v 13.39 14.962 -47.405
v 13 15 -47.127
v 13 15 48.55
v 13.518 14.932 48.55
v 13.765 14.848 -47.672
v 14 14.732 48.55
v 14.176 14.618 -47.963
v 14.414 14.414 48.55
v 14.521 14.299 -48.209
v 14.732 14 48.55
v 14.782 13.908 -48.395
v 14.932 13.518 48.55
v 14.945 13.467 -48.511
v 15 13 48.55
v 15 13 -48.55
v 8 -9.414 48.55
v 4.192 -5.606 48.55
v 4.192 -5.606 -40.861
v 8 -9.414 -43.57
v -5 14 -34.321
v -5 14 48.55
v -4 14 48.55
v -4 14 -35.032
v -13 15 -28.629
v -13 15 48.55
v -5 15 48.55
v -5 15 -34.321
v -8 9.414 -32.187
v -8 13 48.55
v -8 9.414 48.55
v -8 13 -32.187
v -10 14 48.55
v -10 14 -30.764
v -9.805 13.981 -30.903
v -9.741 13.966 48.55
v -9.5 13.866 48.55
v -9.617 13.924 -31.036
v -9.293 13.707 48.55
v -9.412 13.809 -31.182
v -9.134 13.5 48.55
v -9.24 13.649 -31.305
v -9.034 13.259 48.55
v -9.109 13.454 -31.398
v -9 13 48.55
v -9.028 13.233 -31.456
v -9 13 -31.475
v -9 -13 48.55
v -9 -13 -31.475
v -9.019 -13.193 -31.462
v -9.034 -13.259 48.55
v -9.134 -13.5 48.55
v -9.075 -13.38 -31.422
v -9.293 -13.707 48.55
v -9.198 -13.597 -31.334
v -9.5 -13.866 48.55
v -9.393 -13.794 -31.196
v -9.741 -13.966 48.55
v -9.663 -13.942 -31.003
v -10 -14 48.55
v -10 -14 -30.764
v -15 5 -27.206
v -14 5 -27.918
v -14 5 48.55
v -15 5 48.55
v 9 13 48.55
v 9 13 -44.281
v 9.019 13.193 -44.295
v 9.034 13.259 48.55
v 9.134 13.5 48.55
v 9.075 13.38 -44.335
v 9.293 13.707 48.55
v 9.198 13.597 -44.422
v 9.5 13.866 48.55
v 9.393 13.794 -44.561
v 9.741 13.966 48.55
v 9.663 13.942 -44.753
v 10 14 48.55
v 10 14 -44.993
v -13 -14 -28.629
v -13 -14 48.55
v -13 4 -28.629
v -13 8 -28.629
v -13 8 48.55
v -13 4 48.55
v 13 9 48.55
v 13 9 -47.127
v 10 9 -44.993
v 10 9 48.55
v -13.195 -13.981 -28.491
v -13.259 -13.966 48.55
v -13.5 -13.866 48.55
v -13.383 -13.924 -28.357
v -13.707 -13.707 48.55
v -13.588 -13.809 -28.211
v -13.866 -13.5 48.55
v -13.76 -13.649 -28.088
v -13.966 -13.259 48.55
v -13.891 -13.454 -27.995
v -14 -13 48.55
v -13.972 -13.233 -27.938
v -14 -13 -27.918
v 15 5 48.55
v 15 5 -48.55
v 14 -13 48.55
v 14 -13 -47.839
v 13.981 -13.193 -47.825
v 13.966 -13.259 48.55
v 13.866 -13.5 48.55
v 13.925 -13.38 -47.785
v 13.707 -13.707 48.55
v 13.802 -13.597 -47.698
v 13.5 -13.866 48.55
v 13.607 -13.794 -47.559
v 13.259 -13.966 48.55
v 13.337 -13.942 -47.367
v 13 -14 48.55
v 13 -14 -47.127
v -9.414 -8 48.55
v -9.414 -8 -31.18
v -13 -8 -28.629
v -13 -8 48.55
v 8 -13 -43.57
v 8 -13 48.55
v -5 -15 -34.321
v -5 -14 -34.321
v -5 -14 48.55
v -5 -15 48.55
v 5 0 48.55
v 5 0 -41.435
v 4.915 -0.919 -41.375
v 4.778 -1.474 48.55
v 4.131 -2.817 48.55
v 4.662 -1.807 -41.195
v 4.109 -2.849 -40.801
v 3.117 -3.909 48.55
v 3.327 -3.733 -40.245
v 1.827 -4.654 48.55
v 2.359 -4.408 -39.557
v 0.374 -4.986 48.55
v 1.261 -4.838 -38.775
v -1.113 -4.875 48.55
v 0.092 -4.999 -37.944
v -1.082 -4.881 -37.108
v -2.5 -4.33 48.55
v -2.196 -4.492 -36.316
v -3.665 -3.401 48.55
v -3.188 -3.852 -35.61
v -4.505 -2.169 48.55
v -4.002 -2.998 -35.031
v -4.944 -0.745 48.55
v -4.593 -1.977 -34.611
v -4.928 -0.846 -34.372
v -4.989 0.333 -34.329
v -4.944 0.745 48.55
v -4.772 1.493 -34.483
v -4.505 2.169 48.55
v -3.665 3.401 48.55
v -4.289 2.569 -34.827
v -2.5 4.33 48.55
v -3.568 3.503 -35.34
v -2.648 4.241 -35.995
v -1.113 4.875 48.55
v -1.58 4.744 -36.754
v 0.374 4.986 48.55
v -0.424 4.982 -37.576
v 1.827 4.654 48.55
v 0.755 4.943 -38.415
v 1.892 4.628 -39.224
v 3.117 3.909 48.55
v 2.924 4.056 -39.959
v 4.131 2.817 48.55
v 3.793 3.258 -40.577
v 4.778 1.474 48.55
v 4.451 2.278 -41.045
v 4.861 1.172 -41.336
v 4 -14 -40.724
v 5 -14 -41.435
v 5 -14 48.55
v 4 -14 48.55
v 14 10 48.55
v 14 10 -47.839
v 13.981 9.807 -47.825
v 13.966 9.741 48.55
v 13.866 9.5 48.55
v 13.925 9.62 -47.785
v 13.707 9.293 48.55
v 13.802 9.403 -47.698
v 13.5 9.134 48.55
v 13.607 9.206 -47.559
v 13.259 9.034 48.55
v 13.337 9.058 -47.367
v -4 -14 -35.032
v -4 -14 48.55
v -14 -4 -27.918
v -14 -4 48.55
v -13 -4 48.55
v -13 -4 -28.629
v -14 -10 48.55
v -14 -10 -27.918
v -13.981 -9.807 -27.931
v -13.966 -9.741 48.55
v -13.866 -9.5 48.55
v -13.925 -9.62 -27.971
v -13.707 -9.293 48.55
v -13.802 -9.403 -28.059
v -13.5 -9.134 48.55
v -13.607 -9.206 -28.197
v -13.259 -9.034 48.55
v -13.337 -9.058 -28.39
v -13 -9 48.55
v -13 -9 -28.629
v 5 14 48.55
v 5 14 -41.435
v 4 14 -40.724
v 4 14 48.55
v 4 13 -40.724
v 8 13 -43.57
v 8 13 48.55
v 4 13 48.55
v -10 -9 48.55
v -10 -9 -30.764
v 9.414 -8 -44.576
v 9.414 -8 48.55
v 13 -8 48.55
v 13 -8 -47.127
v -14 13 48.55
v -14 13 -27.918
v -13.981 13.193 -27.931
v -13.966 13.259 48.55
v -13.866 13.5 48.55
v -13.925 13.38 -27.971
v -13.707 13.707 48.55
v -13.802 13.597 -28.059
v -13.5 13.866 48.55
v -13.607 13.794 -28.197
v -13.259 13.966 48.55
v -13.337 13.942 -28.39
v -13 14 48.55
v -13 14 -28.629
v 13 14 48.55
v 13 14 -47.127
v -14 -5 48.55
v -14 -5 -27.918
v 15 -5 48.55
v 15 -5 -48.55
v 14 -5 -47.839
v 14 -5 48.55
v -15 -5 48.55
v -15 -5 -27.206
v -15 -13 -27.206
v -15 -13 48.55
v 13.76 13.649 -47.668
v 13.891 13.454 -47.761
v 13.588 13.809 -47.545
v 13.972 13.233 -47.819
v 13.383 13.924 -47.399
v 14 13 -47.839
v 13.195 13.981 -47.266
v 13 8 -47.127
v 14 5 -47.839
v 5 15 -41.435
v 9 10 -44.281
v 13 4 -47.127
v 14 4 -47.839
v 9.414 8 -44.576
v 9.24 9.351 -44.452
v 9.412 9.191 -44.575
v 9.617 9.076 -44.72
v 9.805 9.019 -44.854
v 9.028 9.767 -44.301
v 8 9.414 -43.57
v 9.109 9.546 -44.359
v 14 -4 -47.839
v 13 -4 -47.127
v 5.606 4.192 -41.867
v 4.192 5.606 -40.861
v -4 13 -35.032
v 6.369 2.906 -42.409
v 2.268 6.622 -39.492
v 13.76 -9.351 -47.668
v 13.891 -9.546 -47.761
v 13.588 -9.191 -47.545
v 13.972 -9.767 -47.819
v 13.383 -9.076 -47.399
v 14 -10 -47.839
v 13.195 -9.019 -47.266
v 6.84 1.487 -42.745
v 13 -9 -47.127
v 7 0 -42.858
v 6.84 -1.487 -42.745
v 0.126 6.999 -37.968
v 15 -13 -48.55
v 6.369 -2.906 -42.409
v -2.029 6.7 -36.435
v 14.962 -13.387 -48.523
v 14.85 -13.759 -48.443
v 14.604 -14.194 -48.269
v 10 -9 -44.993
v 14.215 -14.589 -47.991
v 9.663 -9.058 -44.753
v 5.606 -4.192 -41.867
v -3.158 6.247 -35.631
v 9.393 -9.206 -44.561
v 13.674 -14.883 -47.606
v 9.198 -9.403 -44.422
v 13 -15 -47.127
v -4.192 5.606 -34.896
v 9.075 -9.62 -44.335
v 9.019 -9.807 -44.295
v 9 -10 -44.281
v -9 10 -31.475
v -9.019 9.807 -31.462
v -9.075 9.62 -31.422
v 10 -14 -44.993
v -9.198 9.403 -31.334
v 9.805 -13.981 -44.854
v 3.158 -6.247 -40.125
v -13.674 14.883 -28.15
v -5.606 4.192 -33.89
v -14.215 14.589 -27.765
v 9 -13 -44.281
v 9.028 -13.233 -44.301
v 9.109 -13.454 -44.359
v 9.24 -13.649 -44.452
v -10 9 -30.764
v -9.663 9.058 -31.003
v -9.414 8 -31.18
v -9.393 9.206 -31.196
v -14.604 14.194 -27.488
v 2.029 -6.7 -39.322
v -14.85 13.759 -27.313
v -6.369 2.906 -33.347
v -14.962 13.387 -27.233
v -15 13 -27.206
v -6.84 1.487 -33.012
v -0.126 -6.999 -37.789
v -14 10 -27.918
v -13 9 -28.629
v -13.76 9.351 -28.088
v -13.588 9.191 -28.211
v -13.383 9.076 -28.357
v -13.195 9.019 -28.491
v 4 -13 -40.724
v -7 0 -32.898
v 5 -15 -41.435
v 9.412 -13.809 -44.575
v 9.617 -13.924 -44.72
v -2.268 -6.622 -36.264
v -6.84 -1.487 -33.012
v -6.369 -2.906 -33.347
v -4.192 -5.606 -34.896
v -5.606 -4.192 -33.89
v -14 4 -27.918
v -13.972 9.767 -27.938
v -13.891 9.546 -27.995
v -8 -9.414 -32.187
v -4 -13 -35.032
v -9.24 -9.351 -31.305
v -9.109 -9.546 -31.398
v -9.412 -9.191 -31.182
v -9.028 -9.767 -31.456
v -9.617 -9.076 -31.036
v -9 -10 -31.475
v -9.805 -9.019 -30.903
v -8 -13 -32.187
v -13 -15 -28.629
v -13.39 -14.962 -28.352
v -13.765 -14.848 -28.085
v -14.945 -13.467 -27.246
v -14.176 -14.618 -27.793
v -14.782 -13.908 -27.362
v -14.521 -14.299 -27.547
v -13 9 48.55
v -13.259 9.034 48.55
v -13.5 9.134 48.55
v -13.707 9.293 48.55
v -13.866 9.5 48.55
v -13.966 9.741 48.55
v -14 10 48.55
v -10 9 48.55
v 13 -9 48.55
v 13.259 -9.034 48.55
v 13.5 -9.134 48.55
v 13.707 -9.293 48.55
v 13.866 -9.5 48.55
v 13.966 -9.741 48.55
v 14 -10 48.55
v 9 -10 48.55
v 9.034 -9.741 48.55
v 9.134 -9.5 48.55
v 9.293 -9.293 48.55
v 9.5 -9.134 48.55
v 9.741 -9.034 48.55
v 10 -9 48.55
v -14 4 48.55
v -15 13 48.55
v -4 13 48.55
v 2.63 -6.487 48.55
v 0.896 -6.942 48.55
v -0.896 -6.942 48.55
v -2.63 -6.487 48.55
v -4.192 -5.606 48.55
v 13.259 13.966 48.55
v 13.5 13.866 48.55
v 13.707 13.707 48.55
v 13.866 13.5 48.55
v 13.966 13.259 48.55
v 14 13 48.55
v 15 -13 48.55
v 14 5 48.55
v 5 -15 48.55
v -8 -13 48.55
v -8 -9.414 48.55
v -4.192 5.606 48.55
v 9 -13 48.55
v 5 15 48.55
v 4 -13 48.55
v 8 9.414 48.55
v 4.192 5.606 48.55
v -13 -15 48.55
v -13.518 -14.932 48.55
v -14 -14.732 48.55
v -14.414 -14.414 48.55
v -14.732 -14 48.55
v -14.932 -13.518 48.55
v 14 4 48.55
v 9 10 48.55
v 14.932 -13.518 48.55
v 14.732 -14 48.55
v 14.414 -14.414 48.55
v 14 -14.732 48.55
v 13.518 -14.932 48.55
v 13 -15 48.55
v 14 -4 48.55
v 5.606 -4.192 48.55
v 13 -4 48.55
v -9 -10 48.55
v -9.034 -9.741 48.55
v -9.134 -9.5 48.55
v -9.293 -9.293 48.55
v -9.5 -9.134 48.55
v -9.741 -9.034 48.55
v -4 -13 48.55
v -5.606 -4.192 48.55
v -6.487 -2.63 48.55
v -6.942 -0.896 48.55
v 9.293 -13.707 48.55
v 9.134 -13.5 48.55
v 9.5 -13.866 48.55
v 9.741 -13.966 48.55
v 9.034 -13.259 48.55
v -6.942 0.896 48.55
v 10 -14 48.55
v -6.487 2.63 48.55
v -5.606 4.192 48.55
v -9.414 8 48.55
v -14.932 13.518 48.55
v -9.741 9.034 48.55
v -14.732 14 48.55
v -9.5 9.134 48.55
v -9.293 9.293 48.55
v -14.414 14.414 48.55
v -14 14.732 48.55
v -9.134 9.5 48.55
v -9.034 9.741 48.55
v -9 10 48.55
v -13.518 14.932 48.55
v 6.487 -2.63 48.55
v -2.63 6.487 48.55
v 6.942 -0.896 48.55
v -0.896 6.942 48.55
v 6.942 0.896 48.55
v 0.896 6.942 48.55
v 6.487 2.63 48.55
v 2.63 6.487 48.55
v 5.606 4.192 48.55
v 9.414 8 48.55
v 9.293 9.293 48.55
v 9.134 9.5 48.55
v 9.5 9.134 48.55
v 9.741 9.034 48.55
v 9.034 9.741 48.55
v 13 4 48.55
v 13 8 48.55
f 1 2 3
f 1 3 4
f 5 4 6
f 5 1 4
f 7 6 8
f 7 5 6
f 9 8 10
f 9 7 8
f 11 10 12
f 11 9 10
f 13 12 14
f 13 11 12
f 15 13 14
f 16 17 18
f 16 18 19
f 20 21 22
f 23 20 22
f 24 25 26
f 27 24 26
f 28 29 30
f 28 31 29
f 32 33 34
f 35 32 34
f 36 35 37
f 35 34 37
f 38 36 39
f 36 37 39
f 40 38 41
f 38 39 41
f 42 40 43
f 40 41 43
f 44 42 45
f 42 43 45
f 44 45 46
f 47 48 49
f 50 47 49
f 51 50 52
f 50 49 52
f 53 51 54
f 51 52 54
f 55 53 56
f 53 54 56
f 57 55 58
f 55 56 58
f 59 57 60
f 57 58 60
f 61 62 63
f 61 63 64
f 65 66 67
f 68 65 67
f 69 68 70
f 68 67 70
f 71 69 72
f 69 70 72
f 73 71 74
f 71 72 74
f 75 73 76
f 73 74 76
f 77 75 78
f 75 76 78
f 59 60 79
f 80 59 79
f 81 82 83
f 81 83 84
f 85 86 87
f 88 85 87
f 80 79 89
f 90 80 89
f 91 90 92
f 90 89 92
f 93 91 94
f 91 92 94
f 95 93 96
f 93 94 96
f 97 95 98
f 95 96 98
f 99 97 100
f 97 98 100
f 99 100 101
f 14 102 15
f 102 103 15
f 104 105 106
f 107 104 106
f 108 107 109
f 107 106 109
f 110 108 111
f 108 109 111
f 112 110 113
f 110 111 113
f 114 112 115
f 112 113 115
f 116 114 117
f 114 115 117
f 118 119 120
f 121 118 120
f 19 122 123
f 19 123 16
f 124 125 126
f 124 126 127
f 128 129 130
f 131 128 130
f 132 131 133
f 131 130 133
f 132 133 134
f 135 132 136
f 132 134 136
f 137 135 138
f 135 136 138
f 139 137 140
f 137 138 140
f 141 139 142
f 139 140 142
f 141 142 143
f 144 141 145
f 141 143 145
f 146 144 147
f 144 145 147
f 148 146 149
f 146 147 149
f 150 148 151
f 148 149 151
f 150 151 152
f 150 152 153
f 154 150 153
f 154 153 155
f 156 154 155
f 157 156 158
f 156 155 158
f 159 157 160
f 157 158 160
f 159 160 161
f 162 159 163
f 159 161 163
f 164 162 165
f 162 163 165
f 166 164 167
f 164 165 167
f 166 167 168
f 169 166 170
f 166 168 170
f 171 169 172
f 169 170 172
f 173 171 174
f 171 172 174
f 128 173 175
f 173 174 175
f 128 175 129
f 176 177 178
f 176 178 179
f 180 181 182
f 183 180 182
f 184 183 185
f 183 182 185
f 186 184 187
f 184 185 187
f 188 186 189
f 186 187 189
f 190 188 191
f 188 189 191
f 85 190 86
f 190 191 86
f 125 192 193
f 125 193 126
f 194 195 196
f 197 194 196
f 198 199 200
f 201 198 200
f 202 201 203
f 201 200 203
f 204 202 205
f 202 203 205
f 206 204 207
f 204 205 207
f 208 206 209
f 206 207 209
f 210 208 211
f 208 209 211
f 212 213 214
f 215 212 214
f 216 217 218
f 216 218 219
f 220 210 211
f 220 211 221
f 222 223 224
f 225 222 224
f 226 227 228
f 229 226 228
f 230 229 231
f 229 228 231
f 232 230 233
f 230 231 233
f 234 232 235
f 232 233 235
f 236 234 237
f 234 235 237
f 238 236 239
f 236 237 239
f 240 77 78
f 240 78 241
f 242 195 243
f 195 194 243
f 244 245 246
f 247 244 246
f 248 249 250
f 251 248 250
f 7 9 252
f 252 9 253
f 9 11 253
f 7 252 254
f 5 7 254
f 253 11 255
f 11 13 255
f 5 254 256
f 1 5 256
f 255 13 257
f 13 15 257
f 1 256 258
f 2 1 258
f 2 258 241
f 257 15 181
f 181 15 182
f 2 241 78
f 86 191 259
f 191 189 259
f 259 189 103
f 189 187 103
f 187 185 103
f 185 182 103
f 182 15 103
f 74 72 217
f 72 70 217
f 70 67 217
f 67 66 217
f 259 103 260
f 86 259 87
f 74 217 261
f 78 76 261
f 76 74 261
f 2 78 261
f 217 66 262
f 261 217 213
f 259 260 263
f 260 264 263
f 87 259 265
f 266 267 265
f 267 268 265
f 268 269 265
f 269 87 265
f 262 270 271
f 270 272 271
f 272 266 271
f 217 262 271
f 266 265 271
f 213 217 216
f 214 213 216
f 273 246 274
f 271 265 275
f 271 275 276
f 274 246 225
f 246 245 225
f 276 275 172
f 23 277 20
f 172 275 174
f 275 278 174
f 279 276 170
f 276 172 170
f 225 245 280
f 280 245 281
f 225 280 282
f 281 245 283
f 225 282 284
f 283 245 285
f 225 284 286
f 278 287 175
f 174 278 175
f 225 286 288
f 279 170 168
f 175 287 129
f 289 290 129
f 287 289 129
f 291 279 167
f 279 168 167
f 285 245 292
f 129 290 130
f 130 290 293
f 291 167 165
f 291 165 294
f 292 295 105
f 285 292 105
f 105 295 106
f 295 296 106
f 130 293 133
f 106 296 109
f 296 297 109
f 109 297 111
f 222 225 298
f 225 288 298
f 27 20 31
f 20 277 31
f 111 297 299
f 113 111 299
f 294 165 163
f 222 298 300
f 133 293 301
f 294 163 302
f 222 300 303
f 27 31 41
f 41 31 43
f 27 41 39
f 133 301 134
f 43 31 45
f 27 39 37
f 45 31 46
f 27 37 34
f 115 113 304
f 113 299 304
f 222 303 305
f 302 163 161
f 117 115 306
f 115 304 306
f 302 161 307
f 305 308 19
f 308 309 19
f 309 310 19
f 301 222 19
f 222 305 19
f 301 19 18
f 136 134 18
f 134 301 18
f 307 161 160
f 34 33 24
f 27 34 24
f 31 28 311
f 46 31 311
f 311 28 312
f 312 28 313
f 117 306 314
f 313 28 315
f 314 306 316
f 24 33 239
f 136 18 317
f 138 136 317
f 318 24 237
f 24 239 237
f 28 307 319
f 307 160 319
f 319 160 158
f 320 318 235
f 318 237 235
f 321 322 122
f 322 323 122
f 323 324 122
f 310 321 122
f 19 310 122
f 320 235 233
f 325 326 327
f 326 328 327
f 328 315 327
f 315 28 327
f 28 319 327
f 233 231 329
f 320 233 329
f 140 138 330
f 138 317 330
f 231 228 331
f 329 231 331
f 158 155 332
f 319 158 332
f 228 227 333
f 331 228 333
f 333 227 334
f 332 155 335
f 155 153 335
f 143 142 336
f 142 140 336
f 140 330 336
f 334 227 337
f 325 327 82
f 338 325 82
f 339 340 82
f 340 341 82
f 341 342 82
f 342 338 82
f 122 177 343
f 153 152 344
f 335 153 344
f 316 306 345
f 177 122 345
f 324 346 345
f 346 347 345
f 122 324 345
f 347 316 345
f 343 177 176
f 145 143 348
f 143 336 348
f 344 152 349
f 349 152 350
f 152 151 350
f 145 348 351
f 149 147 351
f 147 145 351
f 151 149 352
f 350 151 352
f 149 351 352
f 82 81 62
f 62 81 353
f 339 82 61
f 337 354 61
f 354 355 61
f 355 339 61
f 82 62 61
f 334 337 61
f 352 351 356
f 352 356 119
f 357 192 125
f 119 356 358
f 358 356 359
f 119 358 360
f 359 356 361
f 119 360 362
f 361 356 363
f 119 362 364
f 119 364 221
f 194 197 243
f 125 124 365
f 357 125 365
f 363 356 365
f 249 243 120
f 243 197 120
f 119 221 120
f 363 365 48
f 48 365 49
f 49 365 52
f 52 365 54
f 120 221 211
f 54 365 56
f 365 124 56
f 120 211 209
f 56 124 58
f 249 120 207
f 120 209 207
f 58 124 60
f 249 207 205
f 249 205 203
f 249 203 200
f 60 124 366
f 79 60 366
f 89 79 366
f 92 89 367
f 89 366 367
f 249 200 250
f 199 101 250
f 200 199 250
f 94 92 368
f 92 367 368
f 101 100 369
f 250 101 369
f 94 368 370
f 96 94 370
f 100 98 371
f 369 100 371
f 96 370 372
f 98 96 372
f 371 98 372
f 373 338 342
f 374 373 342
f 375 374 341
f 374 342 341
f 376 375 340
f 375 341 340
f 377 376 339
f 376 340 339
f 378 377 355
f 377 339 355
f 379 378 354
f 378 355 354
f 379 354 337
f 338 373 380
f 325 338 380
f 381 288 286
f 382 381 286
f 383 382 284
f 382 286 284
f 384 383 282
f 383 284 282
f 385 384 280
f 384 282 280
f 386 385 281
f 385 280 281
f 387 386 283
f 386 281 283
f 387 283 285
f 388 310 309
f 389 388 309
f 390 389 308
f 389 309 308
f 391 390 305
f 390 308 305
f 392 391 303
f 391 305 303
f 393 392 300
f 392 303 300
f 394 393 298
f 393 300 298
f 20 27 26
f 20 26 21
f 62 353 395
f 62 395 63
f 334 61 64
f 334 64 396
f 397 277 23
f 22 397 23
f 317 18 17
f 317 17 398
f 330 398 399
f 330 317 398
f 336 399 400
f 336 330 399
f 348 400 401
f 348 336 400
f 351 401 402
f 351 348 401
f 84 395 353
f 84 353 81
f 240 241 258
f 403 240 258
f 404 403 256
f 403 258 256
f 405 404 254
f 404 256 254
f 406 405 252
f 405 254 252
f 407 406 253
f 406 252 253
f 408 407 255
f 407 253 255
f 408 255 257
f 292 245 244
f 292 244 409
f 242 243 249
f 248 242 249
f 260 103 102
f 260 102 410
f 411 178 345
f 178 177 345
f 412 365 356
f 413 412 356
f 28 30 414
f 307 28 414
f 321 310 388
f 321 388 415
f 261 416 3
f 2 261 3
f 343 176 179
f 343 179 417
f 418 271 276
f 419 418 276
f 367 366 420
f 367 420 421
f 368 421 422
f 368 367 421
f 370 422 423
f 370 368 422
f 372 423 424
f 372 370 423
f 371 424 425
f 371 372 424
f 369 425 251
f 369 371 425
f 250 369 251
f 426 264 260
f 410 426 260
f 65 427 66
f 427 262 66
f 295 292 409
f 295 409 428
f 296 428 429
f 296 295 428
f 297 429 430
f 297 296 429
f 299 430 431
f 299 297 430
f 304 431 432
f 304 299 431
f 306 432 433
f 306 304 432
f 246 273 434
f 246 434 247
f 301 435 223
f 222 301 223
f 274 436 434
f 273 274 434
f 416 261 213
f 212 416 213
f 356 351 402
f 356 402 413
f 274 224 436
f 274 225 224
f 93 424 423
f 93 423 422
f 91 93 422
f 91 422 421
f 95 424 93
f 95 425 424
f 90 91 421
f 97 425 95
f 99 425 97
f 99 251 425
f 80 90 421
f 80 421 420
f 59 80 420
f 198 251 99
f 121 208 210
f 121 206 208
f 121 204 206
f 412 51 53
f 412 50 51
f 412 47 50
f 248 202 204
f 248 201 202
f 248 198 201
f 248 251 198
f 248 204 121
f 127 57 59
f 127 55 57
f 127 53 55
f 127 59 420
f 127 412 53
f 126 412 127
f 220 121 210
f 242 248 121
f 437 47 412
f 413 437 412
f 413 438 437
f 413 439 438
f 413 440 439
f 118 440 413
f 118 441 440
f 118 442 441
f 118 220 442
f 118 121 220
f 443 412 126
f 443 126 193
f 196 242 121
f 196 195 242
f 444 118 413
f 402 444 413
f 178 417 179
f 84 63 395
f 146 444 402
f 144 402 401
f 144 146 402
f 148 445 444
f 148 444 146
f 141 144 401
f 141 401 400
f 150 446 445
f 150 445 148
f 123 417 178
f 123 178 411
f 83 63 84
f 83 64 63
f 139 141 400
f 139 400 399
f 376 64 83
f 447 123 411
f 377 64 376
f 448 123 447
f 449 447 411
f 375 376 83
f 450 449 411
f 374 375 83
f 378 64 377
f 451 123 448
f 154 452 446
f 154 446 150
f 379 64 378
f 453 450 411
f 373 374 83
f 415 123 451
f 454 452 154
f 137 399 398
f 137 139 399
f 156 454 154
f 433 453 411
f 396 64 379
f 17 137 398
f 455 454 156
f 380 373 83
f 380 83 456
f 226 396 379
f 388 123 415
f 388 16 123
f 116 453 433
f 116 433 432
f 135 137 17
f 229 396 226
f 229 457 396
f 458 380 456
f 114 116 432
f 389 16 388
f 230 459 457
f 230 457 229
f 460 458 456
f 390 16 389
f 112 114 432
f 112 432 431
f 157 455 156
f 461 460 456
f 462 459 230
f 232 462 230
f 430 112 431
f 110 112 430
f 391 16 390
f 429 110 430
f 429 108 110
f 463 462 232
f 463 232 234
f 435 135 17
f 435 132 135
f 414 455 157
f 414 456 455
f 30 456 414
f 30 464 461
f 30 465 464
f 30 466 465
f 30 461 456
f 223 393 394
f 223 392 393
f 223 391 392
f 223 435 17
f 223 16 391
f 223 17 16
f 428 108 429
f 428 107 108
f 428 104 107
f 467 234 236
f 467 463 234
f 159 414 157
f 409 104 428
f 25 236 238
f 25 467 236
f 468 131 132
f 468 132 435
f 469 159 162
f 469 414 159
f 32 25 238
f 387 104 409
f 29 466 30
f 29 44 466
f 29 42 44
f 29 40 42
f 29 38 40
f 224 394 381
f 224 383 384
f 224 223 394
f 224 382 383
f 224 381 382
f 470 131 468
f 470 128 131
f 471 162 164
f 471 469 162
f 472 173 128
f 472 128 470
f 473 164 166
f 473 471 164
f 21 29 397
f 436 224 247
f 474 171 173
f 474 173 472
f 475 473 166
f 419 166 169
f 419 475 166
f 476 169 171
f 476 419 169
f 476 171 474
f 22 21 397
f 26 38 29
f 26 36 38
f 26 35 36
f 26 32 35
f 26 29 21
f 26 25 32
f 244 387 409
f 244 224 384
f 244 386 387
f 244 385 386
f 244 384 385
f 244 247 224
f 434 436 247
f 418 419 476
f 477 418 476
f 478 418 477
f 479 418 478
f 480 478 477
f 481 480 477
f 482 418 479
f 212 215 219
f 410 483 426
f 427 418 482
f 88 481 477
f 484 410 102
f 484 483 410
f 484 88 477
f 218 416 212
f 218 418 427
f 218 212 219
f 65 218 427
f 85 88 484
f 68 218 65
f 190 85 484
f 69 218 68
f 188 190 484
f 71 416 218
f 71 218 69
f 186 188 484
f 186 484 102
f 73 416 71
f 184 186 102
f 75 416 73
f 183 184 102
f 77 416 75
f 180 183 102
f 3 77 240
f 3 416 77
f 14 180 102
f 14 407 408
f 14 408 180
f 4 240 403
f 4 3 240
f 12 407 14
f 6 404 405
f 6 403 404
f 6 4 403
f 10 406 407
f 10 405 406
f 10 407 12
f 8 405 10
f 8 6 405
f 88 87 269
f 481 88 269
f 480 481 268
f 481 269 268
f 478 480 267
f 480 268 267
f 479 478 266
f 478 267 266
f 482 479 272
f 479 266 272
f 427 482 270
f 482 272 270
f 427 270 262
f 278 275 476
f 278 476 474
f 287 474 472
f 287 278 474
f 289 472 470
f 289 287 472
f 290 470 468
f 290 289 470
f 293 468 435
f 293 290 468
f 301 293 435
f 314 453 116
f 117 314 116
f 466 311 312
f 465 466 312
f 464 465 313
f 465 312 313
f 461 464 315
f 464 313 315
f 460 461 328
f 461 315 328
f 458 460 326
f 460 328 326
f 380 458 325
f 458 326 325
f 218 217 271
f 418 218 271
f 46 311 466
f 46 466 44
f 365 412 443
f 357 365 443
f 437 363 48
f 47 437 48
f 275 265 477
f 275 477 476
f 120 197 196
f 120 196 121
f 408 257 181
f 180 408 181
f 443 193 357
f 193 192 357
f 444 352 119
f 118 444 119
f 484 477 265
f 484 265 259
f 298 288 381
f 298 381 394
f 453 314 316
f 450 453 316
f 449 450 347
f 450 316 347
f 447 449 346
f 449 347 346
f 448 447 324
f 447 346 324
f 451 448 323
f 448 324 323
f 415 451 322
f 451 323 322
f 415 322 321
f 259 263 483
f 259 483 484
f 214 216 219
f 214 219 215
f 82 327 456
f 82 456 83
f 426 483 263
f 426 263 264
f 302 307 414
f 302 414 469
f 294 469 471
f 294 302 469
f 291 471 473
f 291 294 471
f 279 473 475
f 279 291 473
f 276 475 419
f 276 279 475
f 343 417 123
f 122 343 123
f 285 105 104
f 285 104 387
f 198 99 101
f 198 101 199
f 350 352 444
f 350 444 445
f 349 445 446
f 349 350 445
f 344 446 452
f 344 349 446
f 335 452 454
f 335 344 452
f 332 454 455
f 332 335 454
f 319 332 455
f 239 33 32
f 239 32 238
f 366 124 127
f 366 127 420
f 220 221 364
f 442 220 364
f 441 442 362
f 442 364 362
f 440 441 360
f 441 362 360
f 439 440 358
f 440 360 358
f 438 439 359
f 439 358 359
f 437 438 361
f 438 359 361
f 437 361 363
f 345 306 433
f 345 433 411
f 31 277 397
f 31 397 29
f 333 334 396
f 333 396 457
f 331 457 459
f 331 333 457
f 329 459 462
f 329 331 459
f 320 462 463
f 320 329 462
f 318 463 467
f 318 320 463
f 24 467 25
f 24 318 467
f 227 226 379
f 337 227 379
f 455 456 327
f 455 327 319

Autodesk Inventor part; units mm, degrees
ref_plane "YZ Plane" through (0, 0, 0) normal (1, 0, 0) x (0, 1, 0)
ref_plane "XZ Plane" through (0, 0, 0) normal (0, 1, 0) x (-1, 0, 0)
ref_plane "XY Plane" through (0, 0, 0) normal (0, 0, 1) x (1, 0, 0)
sketch "Sketch1" plane through (0, 0, 0) normal (0, 0, 1) x (1, 0, 0)
  circle A0 centre (0, 0) radius 5
  arc A1 (-13, 15) -> (-15, 13) centre (-13, 13) ccw
  arc A2 (-15, -13) -> (-13, -15) centre (-13, -13) ccw
  arc A3 (13, -15) -> (15, -13) centre (13, -13) ccw
  arc A4 (15, 13) -> (13, 15) centre (13, 13) ccw
  arc A5 (-13, 14) -> (-14, 13) centre (-13, 13) ccw
  arc A6 (-14, -13) -> (-13, -14) centre (-13, -13) ccw
  arc A7 (13, -14) -> (14, -13) centre (13, -13) ccw
  arc A8 (14, 13) -> (13, 14) centre (13, 13) ccw
  line L0 (14, -14) -> (-14, 14) construction
  line L1 (-14, -14) -> (14, 14) construction
  line L2 (15, -15) -> (-15, 15) construction
  line L3 (-15, -15) -> (15, 15) construction
  line L4 (-13, 15) -> (-8, 15)
  line L5 (-8, 13) -> (-8, 8) construction
  line L6 (-9.4142, 8) -> (-13, 8)
  line L7 (-15, 8) -> (-15, 13)
  line L8 (-13, -15) -> (-8, -15)
  line L9 (-8, -13) -> (-8, -9.4142)
  line L10 (-9.4142, -8) -> (-13, -8)
  line L11 (-15, -8) -> (-15, -13)
  line L12 (13, -15) -> (8, -15)
  line L13 (8, -13) -> (8, -9.4142)
  line L14 (9.4142, -8) -> (13, -8)
  line L15 (15, -8) -> (15, -13)
  line L16 (13, 15) -> (8, 15)
  line L17 (8, 13) -> (8, 9.4142)
  line L18 (9.4142, 8) -> (13, 8)
  line L19 (15, 8) -> (15, 13)
  line L20 (-13, 9) -> (-10, 9)
  line L21 (-9, 10) -> (-9, 13)
  line L22 (-10, 14) -> (-13, 14)
  line L23 (-14, 13) -> (-14, 10)
  line L24 (13, 9) -> (10, 9)
  line L25 (9, 10) -> (9, 13)
  line L26 (10, 14) -> (13, 14)
  line L27 (14, 13) -> (14, 10)
  line L28 (13, -9) -> (10, -9)
  line L29 (9, -10) -> (9, -13)
  line L30 (10, -14) -> (13, -14)
  line L31 (14, -13) -> (14, -10)
  line L32 (-13, -9) -> (-10, -9)
  line L33 (-9, -10) -> (-9, -13)
  line L34 (-10, -14) -> (-13, -14)
  line L35 (-14, -13) -> (-14, -10)
  line L36 (-14, 13) -> (-14, 10)
  line L37 (-14, -10) -> (-14, -13)
  line L38 (-14, -13) -> (-14, -10)
  line L39 (-14, 10) -> (-14, 13)
  line L40 (13, -15) -> (5, -15)
  line L41 (-5, -15) -> (-13, -15)
  line L42 (13, -15) -> (5, -15) construction
  line L43 (0, -15) -> (-13, -15) construction
  line L44 (4, -13) -> (8, -13)
  line L45 (-8, -13) -> (-4, -13)
  line L46 (10, -9) -> (13, -9)
  line L47 (14, -10) -> (14, -13)
  line L48 (13, -14) -> (10, -14)
  line L49 (9, -13) -> (9, -10)
  line L50 (5, -14) -> (5, -15)
  line L51 (13, -14) -> (10, -14)
  line L52 (5, -14) -> (4, -14)
  line L53 (4, -14) -> (5, -14)
  line L54 (10, -14) -> (13, -14)
  line L55 (-4, -14) -> (-5, -14)
  line L56 (-10, -14) -> (-13, -14)
  line L57 (-13, -14) -> (-10, -14)
  line L58 (-5, -14) -> (-4, -14)
  line L59 (14, -13) -> (14, -10)
  line L60 (14, 10) -> (14, 13)
  line L61 (14, 13) -> (14, 10)
  line L62 (14, -10) -> (14, -13)
  line L63 (-5, -14) -> (-5, -15)
  line L64 (10, 14) -> (13, 14)
  line L65 (13, 14) -> (10, 14)
  line L66 (-10, 14) -> (-13, 14)
  line L67 (-13, 14) -> (-10, 14)
  line L68 (-5, 15) -> (-5, 14)
  line L69 (-13, 15) -> (-5, 15)
  line L70 (5, 15) -> (13, 15)
  line L71 (-15, 15) -> (-5, 15) construction
  line L72 (5, 15) -> (15, 15) construction
  line L73 (5, 15) -> (5, 14)
  line L74 (8, 13) -> (4, 13)
  line L75 (5, 14) -> (4, 14)
  line L76 (-5, 14) -> (-4, 14)
  line L77 (4, 14) -> (5, 14)
  line L78 (-4, 13) -> (-8, 13)
  line L79 (-4, 14) -> (-5, 14)
  line L80 (4, 13) -> (4, 14)
  line L81 (-4, 13) -> (-4, 14)
  line L82 (-4, -14) -> (-4, -13)
  line L83 (4, -14) -> (4, -13)
  line L84 (-8, 9.4142) -> (-4.1919, 5.6061)
  line L85 (8, 9.4142) -> (4.1919, 5.6061)
  line L86 (9.4142, 8) -> (5.6061, 4.1919)
  line L87 (5.6061, -4.1919) -> (9.4142, -8)
  line L88 (4.1919, -5.6061) -> (8, -9.4142)
  line L89 (-4.1919, -5.6061) -> (-8, -9.4142)
  line L90 (-5.6061, -4.1919) -> (-9.4142, -8)
  line L91 (-9.4142, 8) -> (-5.6061, 4.1919)
  arc A9 (4.1919, 5.6061) -> (-4.1919, 5.6061) centre (0, 0) ccw
  arc A10 (5.6061, -4.1919) -> (5.6061, 4.1919) centre (0, 0) ccw
  arc A11 (-5.6061, 4.1919) -> (-5.6061, -4.1919) centre (0, 0) ccw
  arc A12 (-4.1919, -5.6061) -> (4.1919, -5.6061) centre (0, 0) ccw
  line L92 (-8, 13) -> (-8, 9.4142)
  line L93 (-15, -13) -> (-15, -5) construction
  line L94 (-15, -13) -> (-15, -5)
  line L95 (-15, 5) -> (-15, 13)
  line L96 (15, -5) -> (15, -13) construction
  line L97 (15, 13) -> (15, 5)
  line L98 (15, -5) -> (15, -13)
  line L99 (-14, -4) -> (-14, -5)
  line L100 (14, -4) -> (14, -5)
  line L101 (14, 4) -> (14, 5)
  line L102 (-14, 4) -> (-14, 5)
  line L103 (-13, 8) -> (-13, 4)
  line L104 (13, 4) -> (13, 8)
  line L105 (13, -8) -> (13, -4)
  line L106 (-13, -4) -> (-13, -8)
  line L107 (-14, -5) -> (-15, -5)
  line L108 (15, -5) -> (14, -5)
  line L109 (15, 5) -> (14, 5)
  line L110 (-14, 5) -> (-15, 5)
  line L111 (13, 4) -> (14, 4)
  line L112 (-14, 4) -> (-13, 4)
  line L113 (-14, -4) -> (-13, -4)
  line L114 (13, -4) -> (14, -4)
  arc A13 (-13, -9) -> (-14, -10) centre (-13, -10) ccw
  arc A14 (-9, -10) -> (-10, -9) centre (-10, -10) ccw
  arc A15 (-10, -14) -> (-9, -13) centre (-10, -13) ccw
  arc A16 (10, -9) -> (9, -10) centre (10, -10) ccw
  arc A17 (9, -13) -> (10, -14) centre (10, -13) ccw
  arc A18 (14, -10) -> (13, -9) centre (13, -10) ccw
  arc A19 (10, 14) -> (9, 13) centre (10, 13) ccw
  arc A20 (9, 10) -> (10, 9) centre (10, 10) ccw
  arc A21 (13, 9) -> (14, 10) centre (13, 10) ccw
  arc A22 (-9, 13) -> (-10, 14) centre (-10, 13) ccw
  arc A23 (-10, 9) -> (-9, 10) centre (-10, 10) ccw
  arc A24 (-14, 10) -> (-13, 9) centre (-13, 10) ccw
  point P0 (15, -15)
  point P1 (-5.5858, -7)
  dimension "d0" = 30
  dimension "d1" = 30
  dimension "d2" = 10
  dimension "d4" = 2
  dimension "d11" = 28
  dimension "d12" = 7
  dimension "d13" = 7
  dimension "d15" = 1
  dimension "d16" = 1
  dimension "d17" = 1
  dimension "d18" = 1
  dimension "d19" = 5
  dimension "d23" = 30
  dimension "d27" = 1
  dimension "d30" = 3.5858
  dimension "d31" = 2
  dimension "d32" = 16
  dimension "d33" = 8
  dimension "d34" = 6
  dimension "d35" = 5.5858
extrude "Extrusion1" add sketch "Sketch1" along normal mid plane 97.1
sketch "Sketch3" plane through (-13, -15, 48.55) normal (0, -1, 0) x (1, 0, 0)
  line L0 (18, -97.1) -> (8, -97.1) projected
  line L1 (0, -97.1) -> (-1, -97.1) projected
  line L2 (-1, -97.1) -> (0, -97.1) projected
  line L3 (0, -97.1) -> (3, -97.1) projected
  line L4 (3, -97.1) -> (4, -97.1) projected
  line L5 (4, -97.1) -> (3, -97.1) projected
  line L6 (3, -97.1) -> (0, -97.1) projected
  line L7 (26, -97.1) -> (23, -97.1) projected
  line L8 (23, -97.1) -> (22, -97.1) projected
  line L9 (22, -97.1) -> (23, -97.1) projected
  line L10 (23, -97.1) -> (26, -97.1) projected
  line L11 (26, -97.1) -> (27, -97.1) projected
  line L12 (27, -97.1) -> (26, -97.1) projected
  line L13 (4, -97.1) -> (3, -97.1) projected
  line L14 (3, -97.1) -> (0, -97.1) projected
  line L15 (0, -97.1) -> (-1, -97.1) projected
  line L16 (-1, -97.1) -> (0, -97.1) projected
  line L17 (0, -97.1) -> (3, -97.1) projected
  line L18 (3, -97.1) -> (4, -97.1) projected
  line L19 (23, -97.1) -> (22, -97.1) projected
  line L20 (22, -97.1) -> (23, -97.1) projected
  line L21 (23, -97.1) -> (26, -97.1) projected
  line L22 (26, -97.1) -> (27, -97.1) projected
  line L23 (27, -97.1) -> (26, -97.1) projected
  line L24 (26, -97.1) -> (23, -97.1) projected
  line L25 (5, -97.1) -> (8.8081, -97.1) projected
  line L26 (8.8081, -97.1) -> (17.1919, -97.1) projected
  line L27 (17.1919, -97.1) -> (21, -97.1) projected
  line L28 (21, -97.1) -> (17, -97.1) projected
  line L29 (17, -97.1) -> (18, -97.1) projected
  line L30 (18, -97.1) -> (26, -97.1) projected
  line L31 (26, -97.1) -> (28, -97.1) projected
  line L32 (28, -97.1) -> (27, -97.1) projected
  line L33 (27, -97.1) -> (26, -97.1) projected
  line L34 (26, -97.1) -> (22.4142, -97.1) projected
  line L35 (22.4142, -97.1) -> (18.6061, -97.1) projected
  line L36 (18.6061, -97.1) -> (18.6061, -97.1) projected
  line L37 (18.6061, -97.1) -> (22.4142, -97.1) projected
  line L38 (22.4142, -97.1) -> (26, -97.1) projected
  line L39 (26, -97.1) -> (27, -97.1) projected
  line L40 (27, -97.1) -> (28, -97.1) projected
  line L41 (28, -97.1) -> (26, -97.1) projected
  line L42 (26, -97.1) -> (18, -97.1) projected
  line L43 (18, -97.1) -> (17, -97.1) projected
  line L44 (17, -97.1) -> (21, -97.1) projected
  line L45 (21, -97.1) -> (17.1919, -97.1) projected
  line L46 (17.1919, -97.1) -> (8.8081, -97.1) projected
  line L47 (8.8081, -97.1) -> (5, -97.1) projected
  line L48 (5, -97.1) -> (9, -97.1) projected
  line L49 (9, -97.1) -> (8, -97.1) projected
  line L50 (8, -97.1) -> (0, -97.1) projected
  line L51 (0, -97.1) -> (-2, -97.1) projected
  line L52 (-2, -97.1) -> (-1, -97.1) projected
  line L53 (-1, -97.1) -> (0, -97.1) projected
  line L54 (0, -97.1) -> (3.5858, -97.1) projected
  line L55 (3.5858, -97.1) -> (7.3939, -97.1) projected
  line L56 (7.3939, -97.1) -> (7.3939, -97.1) projected
  line L57 (7.3939, -97.1) -> (3.5858, -97.1) projected
  line L58 (3.5858, -97.1) -> (0, -97.1) projected
  line L59 (0, -97.1) -> (-1, -97.1) projected
  line L60 (-1, -97.1) -> (-2, -97.1) projected
  line L61 (-2, -97.1) -> (0, -97.1) projected
  line L62 (0, -97.1) -> (8, -97.1) projected
  line L63 (8, -97.1) -> (9, -97.1) projected
  line L64 (9, -97.1) -> (5, -97.1) projected
  line L65 (39.4927, -105.2765) -> (-27.442, -57.6557)
  line L66 (-27.442, -57.6557) -> (-27.442, -105.2765)
  line L67 (27, -97.1) -> (27, 0) projected
  line L68 (-27.442, -105.2765) -> (39.4927, -105.2765)
  point P0 (13, -48.55)
  dimension "d36" = 35.43
extrude "Extrusion2" cut sketch "Sketch3" against normal blind 30
equation "\"d1\" = d0"
properties part number "pole_supoort_1" material "Aluminum 6061"
